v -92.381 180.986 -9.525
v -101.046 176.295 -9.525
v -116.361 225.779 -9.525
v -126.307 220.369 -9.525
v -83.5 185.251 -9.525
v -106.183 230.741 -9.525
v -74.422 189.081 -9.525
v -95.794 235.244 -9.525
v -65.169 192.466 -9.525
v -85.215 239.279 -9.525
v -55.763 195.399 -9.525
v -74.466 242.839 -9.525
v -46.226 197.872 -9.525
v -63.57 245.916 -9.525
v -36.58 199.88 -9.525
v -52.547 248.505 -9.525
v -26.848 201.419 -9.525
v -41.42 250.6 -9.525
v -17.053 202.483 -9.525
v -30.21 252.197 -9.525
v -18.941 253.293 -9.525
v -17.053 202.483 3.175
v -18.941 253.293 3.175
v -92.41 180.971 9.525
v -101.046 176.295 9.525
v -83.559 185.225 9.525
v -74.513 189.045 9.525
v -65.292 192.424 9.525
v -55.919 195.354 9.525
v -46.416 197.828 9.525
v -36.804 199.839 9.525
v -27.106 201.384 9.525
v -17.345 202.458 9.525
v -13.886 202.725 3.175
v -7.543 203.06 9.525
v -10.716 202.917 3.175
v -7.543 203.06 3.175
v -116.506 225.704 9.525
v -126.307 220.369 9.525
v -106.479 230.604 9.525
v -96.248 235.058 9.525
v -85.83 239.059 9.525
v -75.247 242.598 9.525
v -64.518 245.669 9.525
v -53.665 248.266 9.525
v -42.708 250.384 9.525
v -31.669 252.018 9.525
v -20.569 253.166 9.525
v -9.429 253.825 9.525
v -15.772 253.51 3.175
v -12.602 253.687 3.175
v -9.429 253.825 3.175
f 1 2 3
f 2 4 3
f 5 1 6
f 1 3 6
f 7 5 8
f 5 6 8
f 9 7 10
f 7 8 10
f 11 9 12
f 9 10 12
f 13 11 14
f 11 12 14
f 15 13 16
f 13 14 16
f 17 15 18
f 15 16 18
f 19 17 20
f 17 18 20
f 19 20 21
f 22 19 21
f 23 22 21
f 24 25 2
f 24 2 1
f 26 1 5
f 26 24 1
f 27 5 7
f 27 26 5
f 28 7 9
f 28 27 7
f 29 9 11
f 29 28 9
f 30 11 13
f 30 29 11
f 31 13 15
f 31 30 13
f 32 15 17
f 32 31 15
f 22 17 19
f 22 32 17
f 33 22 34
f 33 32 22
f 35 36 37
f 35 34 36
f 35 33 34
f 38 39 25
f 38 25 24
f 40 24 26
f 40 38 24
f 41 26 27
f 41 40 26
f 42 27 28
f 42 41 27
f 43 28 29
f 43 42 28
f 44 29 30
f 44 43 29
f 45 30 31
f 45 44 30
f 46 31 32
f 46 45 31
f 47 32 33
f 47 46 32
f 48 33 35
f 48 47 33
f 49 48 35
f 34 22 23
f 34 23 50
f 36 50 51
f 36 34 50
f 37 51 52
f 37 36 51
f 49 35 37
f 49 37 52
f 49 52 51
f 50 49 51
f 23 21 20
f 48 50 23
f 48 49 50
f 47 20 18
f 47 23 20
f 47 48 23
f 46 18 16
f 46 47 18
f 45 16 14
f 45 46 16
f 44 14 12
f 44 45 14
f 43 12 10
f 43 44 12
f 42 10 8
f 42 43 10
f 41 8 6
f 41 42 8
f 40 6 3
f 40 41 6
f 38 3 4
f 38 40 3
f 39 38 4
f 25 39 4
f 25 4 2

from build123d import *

# Parameters (mm, degrees)
F1_DEPTH = 9.525
F3_DEPTH = 12.7


with BuildPart() as f1:
    # F0 (on Top) → F1 (new body, symmetric)
    with BuildSketch(Plane.XY):
        with BuildLine():
            Line((-7.5431177714, 203.059945273), (-9.4288972142, 253.8249315913))
            ThreePointArc((-9.4288972142, 253.8249315913), (-69.899192714, 244.192757587), (-126.3072012065, 220.3689881162))
            Line((-126.3072012065, 220.3689881162), (-101.0457609652, 176.295190493))
            ThreePointArc((-101.0457609652, 176.295190493), (-55.9193541712, 195.3542060696), (-7.5431177714, 203.059945273))
        make_face()
    extrude(amount=F1_DEPTH, both=True)

    # F2 (on face) → F3 (cut)
    with BuildSketch(Plane(origin=(0, 0, -9.525), x_dir=(1, 0, 0), z_dir=(0, 0, -1))):
        with BuildLine():
            ThreePointArc((-7.5431177714, -203.059945273), (-12.3015704517, -202.8272944266), (-17.0532610321, -202.4831506278))
            Line((-17.0532610321, -202.4831506278), (-18.9407001232, -253.292814503))
            ThreePointArc((-18.9407001232, -253.292814503), (-14.1872936257, -253.6034713871), (-9.4288972142, -253.8249315913))
            Line((-9.4288972142, -253.8249315913), (-7.5431177714, -203.059945273))
        make_face()
    extrude(amount=-F3_DEPTH, mode=Mode.SUBTRACT)


solid = f1.part
